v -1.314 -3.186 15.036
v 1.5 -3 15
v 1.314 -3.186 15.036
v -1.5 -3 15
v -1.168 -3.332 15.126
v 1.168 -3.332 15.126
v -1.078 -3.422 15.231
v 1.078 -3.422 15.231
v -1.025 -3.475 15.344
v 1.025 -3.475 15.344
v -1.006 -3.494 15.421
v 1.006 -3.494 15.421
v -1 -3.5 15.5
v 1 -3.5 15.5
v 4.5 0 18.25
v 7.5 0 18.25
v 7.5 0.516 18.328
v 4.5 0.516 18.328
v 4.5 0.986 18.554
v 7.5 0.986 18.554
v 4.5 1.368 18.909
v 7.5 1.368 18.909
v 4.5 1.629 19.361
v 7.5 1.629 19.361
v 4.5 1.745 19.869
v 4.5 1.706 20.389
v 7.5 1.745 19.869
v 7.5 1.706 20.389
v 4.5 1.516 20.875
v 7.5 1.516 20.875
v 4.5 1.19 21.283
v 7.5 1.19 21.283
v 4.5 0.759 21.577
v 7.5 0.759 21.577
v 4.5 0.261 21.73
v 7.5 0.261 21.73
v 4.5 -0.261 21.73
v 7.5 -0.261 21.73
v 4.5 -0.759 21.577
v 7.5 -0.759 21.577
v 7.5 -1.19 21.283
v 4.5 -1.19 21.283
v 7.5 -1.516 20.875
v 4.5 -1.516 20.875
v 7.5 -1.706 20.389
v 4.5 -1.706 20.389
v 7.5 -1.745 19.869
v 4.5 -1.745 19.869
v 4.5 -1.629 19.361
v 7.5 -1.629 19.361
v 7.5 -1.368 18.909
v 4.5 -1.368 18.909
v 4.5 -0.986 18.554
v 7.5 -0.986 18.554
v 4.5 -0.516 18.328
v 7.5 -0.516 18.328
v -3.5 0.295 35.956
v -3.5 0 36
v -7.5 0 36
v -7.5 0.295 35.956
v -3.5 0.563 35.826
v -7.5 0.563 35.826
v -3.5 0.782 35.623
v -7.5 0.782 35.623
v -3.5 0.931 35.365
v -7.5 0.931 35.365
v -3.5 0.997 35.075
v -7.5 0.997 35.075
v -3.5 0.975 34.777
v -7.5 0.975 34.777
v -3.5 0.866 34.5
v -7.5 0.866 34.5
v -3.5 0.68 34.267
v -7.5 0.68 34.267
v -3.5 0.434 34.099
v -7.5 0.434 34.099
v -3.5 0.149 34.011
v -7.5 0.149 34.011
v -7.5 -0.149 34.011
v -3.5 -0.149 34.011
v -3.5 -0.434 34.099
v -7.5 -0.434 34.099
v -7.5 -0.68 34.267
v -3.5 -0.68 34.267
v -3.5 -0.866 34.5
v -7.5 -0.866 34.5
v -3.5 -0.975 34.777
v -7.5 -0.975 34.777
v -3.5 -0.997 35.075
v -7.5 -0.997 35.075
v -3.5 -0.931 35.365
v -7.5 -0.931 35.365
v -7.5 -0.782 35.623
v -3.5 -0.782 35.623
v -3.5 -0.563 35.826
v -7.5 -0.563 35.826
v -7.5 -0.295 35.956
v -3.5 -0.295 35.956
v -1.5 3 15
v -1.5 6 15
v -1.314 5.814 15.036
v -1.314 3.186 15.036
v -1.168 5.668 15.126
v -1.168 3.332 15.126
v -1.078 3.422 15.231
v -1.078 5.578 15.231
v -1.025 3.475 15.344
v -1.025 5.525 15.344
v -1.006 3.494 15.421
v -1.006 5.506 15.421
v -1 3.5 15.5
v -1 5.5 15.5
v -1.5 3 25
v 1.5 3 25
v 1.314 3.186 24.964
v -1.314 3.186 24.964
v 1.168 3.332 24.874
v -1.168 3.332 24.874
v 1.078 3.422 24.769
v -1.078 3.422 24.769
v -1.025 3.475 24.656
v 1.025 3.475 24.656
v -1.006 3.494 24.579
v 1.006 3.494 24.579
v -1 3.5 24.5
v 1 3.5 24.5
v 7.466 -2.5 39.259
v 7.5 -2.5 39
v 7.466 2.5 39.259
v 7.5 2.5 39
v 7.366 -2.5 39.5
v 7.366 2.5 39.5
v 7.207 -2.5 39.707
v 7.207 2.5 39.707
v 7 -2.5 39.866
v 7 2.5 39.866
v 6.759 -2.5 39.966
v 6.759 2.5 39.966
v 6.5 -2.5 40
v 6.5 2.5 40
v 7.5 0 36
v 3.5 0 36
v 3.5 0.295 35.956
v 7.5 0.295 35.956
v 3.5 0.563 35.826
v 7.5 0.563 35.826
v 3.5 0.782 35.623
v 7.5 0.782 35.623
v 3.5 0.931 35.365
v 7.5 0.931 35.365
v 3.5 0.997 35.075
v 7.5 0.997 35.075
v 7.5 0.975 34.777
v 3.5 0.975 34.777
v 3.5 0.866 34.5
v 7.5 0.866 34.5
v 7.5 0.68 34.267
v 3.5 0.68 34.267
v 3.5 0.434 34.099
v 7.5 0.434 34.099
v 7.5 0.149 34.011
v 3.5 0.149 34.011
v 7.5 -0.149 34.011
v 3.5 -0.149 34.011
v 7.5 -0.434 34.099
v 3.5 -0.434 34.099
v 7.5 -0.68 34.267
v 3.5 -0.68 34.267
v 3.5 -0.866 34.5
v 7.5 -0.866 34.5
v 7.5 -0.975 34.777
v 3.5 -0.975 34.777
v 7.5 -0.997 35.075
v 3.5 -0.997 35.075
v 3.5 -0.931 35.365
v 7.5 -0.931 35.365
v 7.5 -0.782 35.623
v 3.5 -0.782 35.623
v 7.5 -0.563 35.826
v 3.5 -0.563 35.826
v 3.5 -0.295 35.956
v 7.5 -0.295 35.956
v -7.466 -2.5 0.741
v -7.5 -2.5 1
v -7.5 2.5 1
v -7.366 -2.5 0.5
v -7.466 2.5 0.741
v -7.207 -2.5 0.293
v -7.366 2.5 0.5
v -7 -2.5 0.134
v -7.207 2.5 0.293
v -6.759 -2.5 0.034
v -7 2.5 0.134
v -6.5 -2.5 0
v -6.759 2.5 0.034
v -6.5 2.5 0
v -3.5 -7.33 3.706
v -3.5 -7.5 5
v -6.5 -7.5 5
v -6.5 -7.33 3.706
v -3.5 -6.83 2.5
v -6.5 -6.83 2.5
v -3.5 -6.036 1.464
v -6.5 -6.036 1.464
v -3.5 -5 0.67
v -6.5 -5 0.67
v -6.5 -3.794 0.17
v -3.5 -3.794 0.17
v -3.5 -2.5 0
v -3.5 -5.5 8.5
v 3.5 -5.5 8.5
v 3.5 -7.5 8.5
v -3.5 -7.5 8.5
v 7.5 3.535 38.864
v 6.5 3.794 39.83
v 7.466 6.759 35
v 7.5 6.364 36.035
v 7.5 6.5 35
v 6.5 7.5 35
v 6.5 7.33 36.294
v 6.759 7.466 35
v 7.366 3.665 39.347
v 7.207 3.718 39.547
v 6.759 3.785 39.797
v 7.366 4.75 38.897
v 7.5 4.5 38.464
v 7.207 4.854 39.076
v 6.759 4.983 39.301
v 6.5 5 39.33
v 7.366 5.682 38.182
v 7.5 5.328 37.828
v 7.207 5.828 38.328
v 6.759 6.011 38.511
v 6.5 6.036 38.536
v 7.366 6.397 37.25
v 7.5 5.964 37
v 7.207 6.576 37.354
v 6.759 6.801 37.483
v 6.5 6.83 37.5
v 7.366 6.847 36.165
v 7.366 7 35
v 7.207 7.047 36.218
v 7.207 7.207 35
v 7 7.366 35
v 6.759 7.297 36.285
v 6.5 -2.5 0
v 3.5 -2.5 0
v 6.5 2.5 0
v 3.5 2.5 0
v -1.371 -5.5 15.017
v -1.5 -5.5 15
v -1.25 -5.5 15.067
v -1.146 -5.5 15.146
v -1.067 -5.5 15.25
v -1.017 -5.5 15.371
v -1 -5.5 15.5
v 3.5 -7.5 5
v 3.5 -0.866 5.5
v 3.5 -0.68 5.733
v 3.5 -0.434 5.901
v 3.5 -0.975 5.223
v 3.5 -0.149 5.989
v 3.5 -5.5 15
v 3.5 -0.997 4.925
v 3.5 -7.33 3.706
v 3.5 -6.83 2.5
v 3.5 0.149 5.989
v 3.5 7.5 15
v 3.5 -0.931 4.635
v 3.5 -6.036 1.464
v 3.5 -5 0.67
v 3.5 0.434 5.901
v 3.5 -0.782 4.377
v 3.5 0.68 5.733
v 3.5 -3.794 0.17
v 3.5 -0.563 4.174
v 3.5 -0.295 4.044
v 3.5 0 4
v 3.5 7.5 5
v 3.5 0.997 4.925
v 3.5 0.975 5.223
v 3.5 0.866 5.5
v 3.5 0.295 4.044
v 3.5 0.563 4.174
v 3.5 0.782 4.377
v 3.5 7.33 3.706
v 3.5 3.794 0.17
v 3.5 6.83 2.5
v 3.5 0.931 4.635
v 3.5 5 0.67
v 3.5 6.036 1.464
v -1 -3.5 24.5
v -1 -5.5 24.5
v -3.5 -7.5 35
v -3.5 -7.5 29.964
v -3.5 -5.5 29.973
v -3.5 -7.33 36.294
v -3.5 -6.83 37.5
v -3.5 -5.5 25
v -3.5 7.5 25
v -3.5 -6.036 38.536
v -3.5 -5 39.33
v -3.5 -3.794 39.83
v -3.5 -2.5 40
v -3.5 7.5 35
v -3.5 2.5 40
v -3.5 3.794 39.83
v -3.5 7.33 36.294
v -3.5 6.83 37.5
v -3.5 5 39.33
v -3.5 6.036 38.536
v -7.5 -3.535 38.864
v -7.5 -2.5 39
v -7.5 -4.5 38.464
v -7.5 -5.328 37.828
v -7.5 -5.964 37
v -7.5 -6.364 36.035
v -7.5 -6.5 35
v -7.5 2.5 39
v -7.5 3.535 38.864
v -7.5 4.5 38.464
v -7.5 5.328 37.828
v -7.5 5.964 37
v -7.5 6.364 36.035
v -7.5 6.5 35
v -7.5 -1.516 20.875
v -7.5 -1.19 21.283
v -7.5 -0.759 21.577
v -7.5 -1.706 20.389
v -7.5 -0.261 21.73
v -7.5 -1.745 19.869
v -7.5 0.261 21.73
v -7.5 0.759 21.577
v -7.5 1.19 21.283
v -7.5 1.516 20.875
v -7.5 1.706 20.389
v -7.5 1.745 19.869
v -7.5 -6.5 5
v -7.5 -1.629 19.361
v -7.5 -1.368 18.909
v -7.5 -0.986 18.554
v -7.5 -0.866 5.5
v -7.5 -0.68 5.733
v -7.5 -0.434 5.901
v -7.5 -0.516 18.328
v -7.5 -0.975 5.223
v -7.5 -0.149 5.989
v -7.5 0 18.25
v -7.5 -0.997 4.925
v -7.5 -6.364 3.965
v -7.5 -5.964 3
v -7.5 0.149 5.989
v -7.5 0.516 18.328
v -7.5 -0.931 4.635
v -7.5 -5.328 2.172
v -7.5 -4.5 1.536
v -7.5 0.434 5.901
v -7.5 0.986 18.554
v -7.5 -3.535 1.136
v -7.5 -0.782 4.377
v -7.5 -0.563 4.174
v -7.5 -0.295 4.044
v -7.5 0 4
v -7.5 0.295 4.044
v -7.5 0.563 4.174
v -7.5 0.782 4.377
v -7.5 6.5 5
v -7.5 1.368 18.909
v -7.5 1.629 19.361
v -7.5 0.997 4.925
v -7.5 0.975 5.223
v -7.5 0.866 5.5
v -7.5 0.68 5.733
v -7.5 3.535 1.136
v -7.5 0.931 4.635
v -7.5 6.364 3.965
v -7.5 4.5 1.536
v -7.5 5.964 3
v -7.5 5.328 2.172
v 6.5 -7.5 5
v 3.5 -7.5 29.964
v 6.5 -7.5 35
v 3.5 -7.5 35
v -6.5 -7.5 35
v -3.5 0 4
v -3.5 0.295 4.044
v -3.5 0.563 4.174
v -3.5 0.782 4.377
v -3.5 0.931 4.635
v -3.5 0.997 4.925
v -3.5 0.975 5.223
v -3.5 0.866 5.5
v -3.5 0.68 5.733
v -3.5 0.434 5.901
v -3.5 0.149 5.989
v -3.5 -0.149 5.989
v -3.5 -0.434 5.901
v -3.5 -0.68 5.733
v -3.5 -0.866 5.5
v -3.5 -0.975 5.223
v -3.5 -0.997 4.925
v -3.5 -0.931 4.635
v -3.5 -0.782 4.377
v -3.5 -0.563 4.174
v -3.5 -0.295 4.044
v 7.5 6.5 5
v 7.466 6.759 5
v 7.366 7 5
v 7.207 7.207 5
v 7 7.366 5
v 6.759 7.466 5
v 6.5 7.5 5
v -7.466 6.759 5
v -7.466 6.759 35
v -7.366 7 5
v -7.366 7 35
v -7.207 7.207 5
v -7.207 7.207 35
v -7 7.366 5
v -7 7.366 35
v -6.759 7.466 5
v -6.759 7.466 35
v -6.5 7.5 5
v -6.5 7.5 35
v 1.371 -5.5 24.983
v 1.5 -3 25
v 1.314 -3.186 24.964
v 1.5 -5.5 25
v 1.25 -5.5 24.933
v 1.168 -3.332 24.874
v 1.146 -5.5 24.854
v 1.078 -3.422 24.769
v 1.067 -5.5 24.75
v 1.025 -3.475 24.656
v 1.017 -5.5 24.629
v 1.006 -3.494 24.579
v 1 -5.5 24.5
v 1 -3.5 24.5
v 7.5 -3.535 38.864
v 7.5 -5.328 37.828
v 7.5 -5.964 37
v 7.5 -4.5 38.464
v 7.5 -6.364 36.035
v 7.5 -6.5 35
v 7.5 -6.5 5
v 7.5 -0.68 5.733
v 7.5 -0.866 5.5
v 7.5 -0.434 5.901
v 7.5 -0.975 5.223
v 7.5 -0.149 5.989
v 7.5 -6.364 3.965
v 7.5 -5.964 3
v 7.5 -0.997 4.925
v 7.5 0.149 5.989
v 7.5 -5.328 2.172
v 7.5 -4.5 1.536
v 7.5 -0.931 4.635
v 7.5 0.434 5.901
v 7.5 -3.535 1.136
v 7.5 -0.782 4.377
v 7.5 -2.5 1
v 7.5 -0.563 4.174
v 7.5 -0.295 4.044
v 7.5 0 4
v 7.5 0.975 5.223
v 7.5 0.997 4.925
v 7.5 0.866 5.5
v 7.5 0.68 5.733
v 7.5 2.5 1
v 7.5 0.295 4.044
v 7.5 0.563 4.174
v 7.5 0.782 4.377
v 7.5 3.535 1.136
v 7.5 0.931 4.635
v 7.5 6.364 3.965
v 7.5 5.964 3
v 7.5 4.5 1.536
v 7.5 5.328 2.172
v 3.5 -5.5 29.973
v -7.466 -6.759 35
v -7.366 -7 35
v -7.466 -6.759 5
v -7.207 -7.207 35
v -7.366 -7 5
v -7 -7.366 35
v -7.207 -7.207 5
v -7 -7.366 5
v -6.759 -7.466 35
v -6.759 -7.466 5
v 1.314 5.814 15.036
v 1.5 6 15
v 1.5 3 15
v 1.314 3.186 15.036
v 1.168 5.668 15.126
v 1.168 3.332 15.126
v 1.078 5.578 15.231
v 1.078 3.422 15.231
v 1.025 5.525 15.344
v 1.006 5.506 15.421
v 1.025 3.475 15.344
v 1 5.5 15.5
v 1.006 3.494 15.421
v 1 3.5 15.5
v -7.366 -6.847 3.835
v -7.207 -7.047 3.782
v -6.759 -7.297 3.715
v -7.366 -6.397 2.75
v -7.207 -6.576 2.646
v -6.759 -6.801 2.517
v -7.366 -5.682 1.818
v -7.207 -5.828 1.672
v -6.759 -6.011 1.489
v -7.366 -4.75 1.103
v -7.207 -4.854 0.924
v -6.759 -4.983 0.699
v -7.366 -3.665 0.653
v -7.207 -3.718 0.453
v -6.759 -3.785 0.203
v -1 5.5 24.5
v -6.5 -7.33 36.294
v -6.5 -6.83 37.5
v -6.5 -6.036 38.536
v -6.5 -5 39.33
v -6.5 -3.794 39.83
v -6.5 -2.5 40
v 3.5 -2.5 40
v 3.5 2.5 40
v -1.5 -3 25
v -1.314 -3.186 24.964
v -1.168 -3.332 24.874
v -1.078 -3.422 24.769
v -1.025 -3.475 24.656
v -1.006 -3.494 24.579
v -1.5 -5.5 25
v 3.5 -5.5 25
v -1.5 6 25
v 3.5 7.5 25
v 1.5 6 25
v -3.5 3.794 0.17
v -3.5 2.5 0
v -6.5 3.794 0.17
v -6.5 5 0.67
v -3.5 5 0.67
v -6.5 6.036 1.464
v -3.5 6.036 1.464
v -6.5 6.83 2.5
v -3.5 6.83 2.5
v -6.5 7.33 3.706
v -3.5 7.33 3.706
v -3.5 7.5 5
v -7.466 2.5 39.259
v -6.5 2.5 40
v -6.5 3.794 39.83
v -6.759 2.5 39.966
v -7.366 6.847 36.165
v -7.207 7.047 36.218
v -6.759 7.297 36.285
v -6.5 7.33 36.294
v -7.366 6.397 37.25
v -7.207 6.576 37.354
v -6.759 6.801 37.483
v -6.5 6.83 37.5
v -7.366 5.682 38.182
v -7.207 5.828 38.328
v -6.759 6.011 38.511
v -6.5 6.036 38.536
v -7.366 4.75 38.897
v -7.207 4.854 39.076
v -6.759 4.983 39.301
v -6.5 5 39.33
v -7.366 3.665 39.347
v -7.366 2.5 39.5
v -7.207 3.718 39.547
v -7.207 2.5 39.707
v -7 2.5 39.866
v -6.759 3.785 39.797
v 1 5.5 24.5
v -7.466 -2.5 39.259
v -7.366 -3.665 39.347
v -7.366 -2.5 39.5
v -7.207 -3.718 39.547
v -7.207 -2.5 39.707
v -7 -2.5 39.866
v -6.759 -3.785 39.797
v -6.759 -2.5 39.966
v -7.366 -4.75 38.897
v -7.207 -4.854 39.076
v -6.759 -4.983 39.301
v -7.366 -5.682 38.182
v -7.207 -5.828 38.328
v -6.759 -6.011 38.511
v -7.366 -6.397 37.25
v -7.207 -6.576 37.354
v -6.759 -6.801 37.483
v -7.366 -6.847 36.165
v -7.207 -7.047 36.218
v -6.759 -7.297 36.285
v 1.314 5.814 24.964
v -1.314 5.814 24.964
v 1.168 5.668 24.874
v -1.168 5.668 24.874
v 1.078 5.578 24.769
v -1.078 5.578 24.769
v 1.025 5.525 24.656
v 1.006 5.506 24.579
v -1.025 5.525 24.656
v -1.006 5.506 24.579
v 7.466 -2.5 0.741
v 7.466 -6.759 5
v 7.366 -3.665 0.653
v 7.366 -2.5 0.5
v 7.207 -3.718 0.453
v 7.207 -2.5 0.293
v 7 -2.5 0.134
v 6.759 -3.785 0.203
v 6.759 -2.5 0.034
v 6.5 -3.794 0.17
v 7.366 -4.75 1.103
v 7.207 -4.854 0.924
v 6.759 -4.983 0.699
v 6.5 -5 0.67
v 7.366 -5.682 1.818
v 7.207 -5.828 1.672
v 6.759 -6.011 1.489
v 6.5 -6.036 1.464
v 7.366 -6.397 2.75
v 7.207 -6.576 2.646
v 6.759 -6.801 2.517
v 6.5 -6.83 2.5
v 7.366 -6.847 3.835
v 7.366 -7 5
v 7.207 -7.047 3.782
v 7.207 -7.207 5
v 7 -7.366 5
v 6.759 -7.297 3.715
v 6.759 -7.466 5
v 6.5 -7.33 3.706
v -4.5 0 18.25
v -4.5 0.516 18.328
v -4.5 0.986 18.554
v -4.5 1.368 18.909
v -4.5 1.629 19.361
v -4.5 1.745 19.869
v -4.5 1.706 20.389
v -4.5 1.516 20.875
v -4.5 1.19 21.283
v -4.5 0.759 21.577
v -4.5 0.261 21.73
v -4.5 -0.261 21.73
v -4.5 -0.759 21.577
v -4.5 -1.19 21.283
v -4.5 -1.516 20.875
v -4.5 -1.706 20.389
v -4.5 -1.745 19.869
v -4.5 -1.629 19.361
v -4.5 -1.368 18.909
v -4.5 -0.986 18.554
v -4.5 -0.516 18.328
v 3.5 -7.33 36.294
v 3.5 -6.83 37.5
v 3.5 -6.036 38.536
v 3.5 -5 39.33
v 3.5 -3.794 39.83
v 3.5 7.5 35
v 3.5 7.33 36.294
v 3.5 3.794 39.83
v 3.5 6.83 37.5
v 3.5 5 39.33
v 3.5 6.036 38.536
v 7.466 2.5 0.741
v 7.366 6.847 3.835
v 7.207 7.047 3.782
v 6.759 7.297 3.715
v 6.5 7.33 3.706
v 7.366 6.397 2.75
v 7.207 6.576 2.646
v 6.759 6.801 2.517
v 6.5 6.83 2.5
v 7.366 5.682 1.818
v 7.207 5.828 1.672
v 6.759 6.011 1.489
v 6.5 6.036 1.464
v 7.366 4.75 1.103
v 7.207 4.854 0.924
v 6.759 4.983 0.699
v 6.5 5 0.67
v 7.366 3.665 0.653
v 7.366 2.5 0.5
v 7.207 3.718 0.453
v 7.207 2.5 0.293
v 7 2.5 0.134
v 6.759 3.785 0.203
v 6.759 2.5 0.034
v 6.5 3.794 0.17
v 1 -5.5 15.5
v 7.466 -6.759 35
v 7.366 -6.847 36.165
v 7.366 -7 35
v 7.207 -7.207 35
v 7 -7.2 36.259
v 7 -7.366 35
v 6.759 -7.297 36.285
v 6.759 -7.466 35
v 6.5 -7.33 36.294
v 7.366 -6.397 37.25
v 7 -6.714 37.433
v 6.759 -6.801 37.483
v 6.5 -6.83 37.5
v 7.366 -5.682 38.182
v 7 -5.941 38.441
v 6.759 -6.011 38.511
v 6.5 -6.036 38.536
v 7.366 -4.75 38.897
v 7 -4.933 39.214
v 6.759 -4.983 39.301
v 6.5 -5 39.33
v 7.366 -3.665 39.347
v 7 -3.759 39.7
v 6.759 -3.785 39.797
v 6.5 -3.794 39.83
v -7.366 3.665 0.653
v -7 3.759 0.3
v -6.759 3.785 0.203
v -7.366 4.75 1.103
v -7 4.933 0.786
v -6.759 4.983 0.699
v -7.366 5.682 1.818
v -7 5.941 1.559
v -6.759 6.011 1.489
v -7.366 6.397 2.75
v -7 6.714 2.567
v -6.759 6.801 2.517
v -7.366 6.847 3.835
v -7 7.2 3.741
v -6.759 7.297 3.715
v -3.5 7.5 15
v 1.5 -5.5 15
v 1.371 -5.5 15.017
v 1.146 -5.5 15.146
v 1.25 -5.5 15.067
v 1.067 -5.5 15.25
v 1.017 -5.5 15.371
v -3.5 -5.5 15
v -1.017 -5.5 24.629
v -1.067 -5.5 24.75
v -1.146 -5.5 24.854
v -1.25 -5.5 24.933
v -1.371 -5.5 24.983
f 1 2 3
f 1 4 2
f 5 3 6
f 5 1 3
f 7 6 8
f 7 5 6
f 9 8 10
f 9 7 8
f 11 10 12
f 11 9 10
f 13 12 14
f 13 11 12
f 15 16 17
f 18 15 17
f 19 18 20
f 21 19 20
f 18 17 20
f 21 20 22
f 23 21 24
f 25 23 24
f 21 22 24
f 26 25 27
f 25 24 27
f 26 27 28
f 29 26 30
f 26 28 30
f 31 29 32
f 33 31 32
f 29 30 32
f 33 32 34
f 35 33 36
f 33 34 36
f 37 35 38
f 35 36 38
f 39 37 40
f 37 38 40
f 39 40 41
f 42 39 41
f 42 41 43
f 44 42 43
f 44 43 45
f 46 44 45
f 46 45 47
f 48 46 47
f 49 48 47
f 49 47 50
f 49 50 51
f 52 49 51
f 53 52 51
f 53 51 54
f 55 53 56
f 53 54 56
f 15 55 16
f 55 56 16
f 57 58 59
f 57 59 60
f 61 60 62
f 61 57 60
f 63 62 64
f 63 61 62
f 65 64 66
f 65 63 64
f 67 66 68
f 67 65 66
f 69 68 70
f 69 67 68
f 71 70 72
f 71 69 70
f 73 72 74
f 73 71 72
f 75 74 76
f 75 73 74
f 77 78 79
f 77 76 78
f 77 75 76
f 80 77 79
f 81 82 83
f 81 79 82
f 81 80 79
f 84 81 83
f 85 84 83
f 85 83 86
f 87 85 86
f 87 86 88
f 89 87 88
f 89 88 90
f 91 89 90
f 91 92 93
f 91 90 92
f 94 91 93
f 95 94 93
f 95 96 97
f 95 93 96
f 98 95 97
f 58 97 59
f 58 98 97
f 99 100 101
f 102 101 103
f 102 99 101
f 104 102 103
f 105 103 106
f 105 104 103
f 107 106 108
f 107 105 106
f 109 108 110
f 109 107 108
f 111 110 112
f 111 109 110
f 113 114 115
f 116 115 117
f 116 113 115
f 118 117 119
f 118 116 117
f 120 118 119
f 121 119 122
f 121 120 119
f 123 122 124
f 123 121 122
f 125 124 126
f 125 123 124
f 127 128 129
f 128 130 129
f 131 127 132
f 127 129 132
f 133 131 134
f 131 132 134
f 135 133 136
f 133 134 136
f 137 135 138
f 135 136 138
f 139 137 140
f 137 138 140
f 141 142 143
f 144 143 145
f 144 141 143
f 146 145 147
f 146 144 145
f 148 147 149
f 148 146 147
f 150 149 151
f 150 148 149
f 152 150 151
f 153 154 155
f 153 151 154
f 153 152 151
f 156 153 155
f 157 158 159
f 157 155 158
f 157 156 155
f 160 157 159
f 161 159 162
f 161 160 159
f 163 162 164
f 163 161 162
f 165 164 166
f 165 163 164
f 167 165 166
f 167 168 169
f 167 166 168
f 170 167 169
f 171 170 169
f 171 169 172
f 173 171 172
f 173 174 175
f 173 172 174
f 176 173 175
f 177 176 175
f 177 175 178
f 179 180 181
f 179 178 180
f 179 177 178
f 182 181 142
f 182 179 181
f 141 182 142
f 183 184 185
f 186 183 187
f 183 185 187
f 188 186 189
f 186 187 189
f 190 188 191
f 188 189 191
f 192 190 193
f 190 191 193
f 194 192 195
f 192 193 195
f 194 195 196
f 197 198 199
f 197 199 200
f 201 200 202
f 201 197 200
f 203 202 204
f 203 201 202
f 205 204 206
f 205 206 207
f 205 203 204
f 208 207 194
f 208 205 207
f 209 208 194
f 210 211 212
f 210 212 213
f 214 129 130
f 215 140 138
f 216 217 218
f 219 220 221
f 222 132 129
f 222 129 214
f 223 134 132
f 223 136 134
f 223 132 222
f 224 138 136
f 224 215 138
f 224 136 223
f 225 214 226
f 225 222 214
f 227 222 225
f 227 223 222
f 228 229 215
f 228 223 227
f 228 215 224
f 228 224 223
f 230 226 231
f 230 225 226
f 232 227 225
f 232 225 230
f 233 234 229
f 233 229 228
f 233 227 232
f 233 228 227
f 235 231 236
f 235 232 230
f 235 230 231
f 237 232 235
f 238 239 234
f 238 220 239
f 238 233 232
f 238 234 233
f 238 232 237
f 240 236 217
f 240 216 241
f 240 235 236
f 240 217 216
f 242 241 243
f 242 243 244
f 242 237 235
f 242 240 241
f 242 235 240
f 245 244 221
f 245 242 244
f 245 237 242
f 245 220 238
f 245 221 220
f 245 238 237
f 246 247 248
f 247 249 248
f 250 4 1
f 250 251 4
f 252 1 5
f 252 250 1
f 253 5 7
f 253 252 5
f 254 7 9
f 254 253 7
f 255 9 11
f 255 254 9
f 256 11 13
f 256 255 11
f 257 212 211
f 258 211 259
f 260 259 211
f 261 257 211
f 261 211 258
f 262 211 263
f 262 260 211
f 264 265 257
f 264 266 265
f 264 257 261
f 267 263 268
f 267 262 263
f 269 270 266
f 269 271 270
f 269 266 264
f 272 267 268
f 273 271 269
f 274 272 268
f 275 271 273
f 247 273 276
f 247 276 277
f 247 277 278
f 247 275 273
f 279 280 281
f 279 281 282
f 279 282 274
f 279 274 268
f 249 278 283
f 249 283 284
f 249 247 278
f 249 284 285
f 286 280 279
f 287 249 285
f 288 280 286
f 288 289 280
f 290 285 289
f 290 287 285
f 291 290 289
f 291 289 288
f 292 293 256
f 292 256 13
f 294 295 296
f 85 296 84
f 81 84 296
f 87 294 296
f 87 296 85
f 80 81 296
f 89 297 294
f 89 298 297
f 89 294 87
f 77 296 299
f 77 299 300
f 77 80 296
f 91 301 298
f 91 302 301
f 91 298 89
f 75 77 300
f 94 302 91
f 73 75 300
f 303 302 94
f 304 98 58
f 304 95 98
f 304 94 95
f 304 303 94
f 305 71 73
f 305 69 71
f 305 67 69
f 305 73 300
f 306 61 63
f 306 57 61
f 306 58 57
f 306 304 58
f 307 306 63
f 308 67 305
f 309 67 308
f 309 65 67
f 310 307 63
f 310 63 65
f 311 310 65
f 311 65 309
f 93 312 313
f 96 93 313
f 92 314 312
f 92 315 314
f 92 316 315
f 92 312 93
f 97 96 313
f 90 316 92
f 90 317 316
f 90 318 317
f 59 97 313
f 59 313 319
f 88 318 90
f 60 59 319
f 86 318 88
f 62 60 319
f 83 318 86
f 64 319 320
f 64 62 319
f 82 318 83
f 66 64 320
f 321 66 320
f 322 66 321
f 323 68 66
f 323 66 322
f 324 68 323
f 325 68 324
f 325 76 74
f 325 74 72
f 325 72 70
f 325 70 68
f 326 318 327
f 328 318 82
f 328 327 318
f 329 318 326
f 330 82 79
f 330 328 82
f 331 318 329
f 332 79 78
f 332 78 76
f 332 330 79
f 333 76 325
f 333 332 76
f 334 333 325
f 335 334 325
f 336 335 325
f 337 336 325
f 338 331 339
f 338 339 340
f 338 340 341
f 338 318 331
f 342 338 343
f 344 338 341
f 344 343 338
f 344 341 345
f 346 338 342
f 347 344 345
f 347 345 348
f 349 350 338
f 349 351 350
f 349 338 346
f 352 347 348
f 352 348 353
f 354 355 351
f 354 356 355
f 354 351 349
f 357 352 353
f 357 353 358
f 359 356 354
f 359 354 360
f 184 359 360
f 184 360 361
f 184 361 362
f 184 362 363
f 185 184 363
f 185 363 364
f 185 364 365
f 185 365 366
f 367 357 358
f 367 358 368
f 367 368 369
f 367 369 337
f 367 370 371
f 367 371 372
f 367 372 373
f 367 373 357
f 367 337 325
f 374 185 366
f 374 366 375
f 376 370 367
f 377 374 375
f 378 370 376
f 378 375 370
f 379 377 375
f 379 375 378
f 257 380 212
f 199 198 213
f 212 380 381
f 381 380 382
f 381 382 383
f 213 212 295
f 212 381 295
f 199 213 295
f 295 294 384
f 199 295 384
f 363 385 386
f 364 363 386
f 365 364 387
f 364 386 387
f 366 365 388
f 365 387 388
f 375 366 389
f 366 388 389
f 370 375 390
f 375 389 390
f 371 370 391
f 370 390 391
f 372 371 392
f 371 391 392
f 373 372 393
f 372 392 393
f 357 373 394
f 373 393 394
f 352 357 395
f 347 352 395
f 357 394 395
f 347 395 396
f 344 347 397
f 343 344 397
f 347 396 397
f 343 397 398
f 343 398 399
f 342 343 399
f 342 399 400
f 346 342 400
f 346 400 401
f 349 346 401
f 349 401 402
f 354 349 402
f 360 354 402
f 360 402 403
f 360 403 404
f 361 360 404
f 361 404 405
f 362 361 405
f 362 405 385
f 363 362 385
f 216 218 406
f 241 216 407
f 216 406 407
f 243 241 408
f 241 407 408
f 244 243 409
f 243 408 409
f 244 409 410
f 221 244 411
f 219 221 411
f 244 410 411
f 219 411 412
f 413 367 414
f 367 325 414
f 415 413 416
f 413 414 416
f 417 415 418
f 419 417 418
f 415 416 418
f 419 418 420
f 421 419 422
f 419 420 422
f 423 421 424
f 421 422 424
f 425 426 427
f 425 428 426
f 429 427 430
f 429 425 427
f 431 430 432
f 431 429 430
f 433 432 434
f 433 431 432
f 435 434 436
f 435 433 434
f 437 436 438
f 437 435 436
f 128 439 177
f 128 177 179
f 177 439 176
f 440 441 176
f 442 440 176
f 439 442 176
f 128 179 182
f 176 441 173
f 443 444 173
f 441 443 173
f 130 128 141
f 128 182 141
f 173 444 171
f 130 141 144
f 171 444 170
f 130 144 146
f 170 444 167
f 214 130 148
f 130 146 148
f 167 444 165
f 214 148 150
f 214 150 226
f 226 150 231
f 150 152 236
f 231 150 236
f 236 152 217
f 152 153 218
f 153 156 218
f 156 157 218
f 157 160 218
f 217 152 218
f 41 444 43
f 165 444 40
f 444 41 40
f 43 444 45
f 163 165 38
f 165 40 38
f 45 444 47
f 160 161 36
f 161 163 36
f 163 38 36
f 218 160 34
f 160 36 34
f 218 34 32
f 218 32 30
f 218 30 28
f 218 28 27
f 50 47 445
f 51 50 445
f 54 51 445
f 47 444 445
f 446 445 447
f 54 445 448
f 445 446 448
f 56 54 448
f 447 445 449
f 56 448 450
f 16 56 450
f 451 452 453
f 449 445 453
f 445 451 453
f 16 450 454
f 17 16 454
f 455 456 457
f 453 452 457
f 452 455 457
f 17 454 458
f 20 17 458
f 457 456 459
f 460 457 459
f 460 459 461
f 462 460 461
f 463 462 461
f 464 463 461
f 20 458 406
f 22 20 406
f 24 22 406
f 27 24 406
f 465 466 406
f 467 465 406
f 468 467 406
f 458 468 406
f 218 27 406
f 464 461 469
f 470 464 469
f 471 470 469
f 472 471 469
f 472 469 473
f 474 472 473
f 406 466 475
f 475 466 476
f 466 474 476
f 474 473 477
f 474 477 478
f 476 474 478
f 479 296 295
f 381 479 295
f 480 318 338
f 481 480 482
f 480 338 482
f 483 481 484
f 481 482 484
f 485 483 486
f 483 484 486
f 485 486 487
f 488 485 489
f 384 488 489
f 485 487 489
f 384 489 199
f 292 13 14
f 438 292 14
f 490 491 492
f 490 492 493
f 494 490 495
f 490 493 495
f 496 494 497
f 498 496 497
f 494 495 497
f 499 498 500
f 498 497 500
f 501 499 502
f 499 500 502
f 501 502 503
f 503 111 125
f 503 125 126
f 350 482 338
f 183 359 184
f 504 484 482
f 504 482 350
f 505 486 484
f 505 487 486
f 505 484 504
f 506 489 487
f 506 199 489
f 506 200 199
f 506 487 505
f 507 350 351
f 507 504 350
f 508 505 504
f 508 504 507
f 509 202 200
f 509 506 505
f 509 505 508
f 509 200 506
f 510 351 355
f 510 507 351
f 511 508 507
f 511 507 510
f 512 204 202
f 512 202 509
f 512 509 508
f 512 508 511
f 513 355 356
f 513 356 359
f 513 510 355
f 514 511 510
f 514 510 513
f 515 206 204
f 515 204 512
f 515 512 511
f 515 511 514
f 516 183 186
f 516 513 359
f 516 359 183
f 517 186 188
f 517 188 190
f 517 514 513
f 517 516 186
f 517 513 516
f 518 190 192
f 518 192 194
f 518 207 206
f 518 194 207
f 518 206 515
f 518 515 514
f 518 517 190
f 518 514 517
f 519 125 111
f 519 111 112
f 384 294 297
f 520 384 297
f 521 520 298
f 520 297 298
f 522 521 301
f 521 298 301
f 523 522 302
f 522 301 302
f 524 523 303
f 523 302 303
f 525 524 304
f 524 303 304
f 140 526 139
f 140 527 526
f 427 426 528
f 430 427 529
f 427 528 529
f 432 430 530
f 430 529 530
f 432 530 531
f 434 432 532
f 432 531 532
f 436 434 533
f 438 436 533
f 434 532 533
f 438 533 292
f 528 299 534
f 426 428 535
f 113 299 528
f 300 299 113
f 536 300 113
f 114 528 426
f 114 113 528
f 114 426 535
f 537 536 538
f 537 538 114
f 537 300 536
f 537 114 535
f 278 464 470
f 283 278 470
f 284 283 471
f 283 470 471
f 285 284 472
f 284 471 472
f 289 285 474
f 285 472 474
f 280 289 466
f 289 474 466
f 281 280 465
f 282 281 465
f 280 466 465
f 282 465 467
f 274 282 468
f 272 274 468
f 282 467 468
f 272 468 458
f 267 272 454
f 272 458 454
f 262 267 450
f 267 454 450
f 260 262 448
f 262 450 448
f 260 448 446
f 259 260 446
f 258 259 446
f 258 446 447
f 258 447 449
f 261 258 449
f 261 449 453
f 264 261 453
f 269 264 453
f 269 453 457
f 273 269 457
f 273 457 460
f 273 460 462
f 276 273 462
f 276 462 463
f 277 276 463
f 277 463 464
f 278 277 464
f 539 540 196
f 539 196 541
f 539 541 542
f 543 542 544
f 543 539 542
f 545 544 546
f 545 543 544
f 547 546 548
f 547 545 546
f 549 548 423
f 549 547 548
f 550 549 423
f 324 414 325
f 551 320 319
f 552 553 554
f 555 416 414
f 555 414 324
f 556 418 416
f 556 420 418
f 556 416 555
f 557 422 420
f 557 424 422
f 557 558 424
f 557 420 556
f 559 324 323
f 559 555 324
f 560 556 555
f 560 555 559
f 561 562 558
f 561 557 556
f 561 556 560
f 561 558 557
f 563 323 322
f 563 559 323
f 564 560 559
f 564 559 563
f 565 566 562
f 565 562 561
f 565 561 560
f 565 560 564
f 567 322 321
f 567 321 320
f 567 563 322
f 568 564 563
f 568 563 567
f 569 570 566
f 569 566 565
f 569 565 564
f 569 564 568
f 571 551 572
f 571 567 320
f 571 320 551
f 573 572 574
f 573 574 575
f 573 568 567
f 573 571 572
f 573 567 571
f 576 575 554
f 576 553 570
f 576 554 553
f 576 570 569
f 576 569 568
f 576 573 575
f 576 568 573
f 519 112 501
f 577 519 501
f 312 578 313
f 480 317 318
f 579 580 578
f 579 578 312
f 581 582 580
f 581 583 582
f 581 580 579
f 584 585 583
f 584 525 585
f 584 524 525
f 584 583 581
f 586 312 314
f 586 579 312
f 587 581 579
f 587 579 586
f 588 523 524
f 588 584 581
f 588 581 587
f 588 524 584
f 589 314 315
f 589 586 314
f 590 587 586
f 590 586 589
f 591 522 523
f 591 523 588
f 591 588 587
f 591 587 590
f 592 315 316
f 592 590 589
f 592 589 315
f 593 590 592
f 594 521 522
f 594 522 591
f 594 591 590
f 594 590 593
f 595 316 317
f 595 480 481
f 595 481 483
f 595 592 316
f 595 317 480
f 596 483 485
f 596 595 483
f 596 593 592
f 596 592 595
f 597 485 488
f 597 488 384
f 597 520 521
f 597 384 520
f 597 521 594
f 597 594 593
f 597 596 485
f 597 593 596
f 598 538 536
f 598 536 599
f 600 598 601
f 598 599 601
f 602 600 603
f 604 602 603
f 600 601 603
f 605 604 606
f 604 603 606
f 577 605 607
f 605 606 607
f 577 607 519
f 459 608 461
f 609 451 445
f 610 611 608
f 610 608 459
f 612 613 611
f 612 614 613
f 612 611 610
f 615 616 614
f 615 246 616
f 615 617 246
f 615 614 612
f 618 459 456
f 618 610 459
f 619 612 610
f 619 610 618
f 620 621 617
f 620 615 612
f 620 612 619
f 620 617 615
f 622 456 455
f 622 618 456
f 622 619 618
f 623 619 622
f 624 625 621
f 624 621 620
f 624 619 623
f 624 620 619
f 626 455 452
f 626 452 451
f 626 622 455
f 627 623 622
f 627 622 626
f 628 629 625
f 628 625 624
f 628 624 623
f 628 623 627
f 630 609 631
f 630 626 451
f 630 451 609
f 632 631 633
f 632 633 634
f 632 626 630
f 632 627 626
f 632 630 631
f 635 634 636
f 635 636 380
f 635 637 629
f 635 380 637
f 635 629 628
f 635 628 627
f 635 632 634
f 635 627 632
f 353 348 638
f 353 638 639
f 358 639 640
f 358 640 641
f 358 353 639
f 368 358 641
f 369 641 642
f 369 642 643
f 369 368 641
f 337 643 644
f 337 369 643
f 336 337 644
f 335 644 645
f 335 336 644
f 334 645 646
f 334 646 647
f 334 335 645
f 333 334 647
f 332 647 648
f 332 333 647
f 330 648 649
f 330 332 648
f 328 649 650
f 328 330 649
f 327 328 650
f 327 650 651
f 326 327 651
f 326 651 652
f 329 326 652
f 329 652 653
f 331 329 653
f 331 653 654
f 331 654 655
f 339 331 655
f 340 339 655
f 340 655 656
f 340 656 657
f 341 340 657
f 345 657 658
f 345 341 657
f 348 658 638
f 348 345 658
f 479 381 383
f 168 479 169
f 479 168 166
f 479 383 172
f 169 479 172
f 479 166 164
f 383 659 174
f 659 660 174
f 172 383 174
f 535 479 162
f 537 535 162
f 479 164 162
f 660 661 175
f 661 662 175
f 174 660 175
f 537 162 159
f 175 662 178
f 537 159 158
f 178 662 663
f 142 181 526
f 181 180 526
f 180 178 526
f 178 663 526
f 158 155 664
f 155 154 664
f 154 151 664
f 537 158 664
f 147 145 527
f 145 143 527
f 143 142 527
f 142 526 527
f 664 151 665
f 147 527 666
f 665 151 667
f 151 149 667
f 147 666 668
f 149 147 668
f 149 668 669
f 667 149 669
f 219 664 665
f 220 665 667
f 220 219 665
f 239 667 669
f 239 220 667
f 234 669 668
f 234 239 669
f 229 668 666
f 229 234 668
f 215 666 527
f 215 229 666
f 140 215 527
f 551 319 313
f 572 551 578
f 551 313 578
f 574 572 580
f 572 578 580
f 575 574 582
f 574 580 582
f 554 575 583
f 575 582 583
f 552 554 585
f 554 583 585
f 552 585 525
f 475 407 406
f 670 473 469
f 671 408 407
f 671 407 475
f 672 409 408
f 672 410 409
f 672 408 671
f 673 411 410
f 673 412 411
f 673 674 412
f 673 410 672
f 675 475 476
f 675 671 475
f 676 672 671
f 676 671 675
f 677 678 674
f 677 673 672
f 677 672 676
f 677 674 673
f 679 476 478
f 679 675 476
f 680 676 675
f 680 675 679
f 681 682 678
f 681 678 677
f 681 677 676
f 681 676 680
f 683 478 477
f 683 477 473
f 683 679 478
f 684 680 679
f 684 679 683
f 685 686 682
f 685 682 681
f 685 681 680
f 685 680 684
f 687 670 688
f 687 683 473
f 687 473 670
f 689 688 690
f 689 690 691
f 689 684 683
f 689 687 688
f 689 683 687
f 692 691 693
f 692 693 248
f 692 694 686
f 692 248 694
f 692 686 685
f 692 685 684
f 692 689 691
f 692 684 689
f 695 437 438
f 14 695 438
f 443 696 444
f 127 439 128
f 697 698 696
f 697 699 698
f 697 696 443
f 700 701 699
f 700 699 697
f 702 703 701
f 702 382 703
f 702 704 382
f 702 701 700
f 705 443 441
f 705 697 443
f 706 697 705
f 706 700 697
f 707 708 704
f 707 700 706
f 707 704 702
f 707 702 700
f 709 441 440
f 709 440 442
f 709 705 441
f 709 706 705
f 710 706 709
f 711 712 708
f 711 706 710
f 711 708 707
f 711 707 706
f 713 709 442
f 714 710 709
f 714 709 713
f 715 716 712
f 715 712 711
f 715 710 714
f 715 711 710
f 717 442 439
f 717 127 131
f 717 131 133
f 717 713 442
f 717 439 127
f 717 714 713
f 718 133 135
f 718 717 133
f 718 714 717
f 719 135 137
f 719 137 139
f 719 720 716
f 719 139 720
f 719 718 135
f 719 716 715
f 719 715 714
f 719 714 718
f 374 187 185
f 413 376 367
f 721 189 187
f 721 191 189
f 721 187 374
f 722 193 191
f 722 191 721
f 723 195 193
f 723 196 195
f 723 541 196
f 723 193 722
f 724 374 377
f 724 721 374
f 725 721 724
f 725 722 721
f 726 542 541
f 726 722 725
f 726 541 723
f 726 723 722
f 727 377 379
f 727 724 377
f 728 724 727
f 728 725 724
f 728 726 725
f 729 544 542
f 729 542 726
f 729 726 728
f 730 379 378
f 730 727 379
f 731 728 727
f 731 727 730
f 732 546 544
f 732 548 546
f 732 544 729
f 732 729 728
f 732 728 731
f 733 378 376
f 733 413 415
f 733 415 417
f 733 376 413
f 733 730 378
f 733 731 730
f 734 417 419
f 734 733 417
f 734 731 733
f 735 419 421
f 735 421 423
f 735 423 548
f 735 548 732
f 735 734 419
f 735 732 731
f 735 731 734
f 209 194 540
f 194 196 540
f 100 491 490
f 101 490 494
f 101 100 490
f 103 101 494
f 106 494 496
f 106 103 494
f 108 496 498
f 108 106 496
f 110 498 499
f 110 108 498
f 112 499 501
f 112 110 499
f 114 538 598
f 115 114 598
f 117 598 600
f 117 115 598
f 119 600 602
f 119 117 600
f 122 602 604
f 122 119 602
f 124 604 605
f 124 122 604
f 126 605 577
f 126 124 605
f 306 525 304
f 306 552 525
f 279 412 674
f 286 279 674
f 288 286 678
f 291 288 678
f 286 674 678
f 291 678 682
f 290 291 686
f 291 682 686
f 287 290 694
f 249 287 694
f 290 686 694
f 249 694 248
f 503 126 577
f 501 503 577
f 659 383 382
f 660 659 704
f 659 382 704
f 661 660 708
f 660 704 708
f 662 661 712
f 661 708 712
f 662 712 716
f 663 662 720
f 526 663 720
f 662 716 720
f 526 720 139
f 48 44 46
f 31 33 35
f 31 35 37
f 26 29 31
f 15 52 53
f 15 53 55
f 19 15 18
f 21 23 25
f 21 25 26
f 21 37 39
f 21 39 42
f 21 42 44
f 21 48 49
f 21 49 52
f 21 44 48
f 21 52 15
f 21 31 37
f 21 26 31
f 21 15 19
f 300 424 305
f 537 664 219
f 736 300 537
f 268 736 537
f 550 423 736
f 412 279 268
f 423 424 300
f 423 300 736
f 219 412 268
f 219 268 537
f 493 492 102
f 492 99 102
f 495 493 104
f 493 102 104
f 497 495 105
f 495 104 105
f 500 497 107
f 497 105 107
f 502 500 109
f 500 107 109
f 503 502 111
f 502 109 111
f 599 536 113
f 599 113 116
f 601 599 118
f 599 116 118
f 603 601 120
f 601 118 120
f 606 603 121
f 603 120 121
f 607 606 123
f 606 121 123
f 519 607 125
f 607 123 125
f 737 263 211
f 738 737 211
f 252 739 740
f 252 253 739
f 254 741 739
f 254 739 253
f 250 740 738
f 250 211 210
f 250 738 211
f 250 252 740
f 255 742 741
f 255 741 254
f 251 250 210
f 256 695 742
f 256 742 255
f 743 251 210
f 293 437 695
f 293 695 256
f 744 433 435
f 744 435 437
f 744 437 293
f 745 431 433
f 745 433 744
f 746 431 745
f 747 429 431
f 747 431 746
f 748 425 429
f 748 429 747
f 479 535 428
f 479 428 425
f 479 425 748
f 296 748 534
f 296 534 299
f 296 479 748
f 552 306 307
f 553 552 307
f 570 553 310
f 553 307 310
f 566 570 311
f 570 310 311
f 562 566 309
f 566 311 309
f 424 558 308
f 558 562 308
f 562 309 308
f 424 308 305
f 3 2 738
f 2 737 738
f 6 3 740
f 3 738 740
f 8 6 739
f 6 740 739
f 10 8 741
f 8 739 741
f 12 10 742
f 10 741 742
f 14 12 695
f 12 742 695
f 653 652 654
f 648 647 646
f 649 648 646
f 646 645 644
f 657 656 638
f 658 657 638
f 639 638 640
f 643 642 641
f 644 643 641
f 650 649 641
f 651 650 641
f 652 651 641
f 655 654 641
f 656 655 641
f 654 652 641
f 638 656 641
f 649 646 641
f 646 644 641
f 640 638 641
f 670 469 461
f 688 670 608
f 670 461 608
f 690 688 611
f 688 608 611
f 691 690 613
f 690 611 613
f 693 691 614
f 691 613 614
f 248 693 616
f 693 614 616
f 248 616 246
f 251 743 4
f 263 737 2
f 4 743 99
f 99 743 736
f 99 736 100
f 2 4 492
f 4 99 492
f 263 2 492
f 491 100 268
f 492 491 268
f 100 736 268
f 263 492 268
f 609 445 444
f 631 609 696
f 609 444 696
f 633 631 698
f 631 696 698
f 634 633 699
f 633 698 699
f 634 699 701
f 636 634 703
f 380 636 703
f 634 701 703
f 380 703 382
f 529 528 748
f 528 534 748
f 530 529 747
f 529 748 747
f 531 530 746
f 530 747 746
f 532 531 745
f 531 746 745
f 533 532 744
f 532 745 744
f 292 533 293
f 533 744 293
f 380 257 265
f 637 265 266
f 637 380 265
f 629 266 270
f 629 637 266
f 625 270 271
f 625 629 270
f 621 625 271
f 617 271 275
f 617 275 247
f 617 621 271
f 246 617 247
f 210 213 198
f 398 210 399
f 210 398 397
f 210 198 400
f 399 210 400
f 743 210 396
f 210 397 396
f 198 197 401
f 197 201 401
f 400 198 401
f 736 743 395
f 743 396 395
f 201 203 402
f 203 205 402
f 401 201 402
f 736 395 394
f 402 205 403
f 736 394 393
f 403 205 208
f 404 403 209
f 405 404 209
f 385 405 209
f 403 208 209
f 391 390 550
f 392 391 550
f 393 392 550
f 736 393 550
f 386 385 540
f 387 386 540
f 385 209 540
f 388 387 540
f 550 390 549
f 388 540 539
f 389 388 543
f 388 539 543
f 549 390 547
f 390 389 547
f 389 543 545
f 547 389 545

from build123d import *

# Parameters (mm, degrees)
BOTTOM_SECTION_BASE_SKETCH_W             = 15
BOTTOM_SECTION_BASE_SKETCH_H             = 15
BOTTOM_SECTION_EXTRUDE_DEPTH             = 40
HINGE_CUTOUT_SKETCH_W                    = 7
HINGE_CUTOUT_SKETCH_H                    = 15
HINGE_CUTOUT_EXTRUDED_CUT_DEPTH          = 15
HINGE_HOLE_SKETCH_R                      = 1
HINGE_HOLE_EXTRUDED_CUT_DEPTH            = 44.373378932
HINGER_CORNER_FILLETS_R                  = 5
STYLE_FILLETS_R                          = 1
ROUTING_HOLES_SKETCH_W                   = 2
ROUTING_HOLES_SKETCH_H                   = 2
ROUTING_HOLES_EXTRUDED_CUT_DEPTH         = 42.382363393
BACKING_START                            = -3.5
BACKING_EXTRUDE_DEPTH                    = 7
BOTTOM_SECTION_CONNECTION_HOLE_R         = 1.75
BOTTOM_SECTION_CONNECTION_HOLE_CUT_DEPTH = 3
SKETCH2_W                                = 7
SKETCH2_H                                = 2
BOTTOM_EXTENSION_EXTRUDE_DEPTH           = 6.5
FILLET1_R                                = 0.5


# Read off the part's stored shape, not the designer's step: Backing Extrude
with BuildPart() as part:
    # Bottom Section Base Sketch → Bottom Section Extrude (new body)
    with BuildSketch(Plane.XY):
        Rectangle(BOTTOM_SECTION_BASE_SKETCH_W, BOTTOM_SECTION_BASE_SKETCH_H)
    extrude(amount=BOTTOM_SECTION_EXTRUDE_DEPTH)

    # Hinge Cutout Sketch → Hinge Cutout Extruded Cut (cut)
    with BuildSketch(Plane.XY):
        Rectangle(HINGE_CUTOUT_SKETCH_W, HINGE_CUTOUT_SKETCH_H)
    hinge_cutout_extruded_cut = extrude(amount=HINGE_CUTOUT_EXTRUDED_CUT_DEPTH, mode=Mode.SUBTRACT)

    # Hinge Hole Sketch → Hinge Hole Extruded Cut (cut, through all)
    with BuildSketch(Plane(origin=(7.5, 0, 0), x_dir=(0, 0, -1), z_dir=(1, 0, 0))):
        with Locations((-5, 0)):
            Circle(HINGE_HOLE_SKETCH_R)
    hinge_hole_extruded_cut = extrude(amount=-HINGE_HOLE_EXTRUDED_CUT_DEPTH, mode=Mode.SUBTRACT)

    # Hinge and Hole Cutout Mirror: Hinge Cutout Extruded Cut, Hinge Hole Extruded Cut across plane
    add(hinge_cutout_extruded_cut.mirror(Plane.XY.offset(20)), mode=Mode.SUBTRACT)
    add(hinge_hole_extruded_cut.mirror(Plane.XY.offset(20)), mode=Mode.SUBTRACT)

    # Hinger Corner Fillets
    hinger_corner_fillets_edges = [part.edges().sort_by_distance(p)[0] for p in [
        (5.5, -7.5, 0),
        (-5.5, 7.5, 0),
        (-5.5, -7.5, 40),
        (-5.5, 7.5, 40),
        (5.5, -7.5, 40),
        (-5.5, -7.5, 0),
        (5.5, 7.5, 0),
        (5.5, 7.5, 40),
    ]]
    fillet(hinger_corner_fillets_edges, radius=HINGER_CORNER_FILLETS_R)

    # Style Fillets
    style_fillets_edges = [part.edges().sort_by_distance(p)[0] for p in [
        (7.5, 0, 40),
        (7.5, 7.5, 20),
        (-7.5, 7.5, 20),
        (7.5, 0, 0),
        (7.5, -7.5, 20),
        (7.5, 6.035533906, 1.464466094),
        (7.5, -6.035533906, 1.464466094),
        (7.5, -6.035533906, 38.535533906),
        (7.5, 6.035533906, 38.535533906),
        (-7.5, -7.5, 20),
        (-7.5, 0, 40),
        (-7.5, 0, 0),
        (-7.5, -6.035533906, 1.464466094),
        (-7.5, 6.035533906, 1.464466094),
        (-7.5, 6.035533906, 38.535533906),
        (-7.5, -6.035533906, 38.535533906),
    ]]
    fillet(style_fillets_edges, radius=STYLE_FILLETS_R)

    # Routing Holes Sketch → Routing Holes Extruded Cut (cut, through all)
    with BuildSketch(Plane.XY):
        with Locations((0, 4.5)):
            Rectangle(ROUTING_HOLES_SKETCH_W, ROUTING_HOLES_SKETCH_H)
        with Locations((0, -4.5)):
            Rectangle(ROUTING_HOLES_SKETCH_W, ROUTING_HOLES_SKETCH_H)
    extrude(amount=ROUTING_HOLES_EXTRUDED_CUT_DEPTH, mode=Mode.SUBTRACT)

    # Backing Extrude outline → Backing Extrude (add)
    with BuildSketch(Plane.YZ.offset(BACKING_START)):
        Polygon((-7.5, 29.963646865), (-7.5, 25), (-5.5, 25), (-5.5, 29.973325422), align=None)
    extrude(amount=BACKING_EXTRUDE_DEPTH)

    # Bottom Section Connection Hole → Bottom Section Connection Hole Cut (cut)
    with BuildSketch(Plane(origin=(7.5, 0, 0), x_dir=(0, 0, -1), z_dir=(1, 0, 0))):
        with Locations((-20, 0)):
            Circle(BOTTOM_SECTION_CONNECTION_HOLE_R)
    bottom_section_connection_hole_cut = extrude(amount=-BOTTOM_SECTION_CONNECTION_HOLE_CUT_DEPTH, mode=Mode.SUBTRACT)

    # Sketch2 → Bottom extension Extrude (add)
    with BuildSketch(Plane(origin=(0, 0, 15), x_dir=(-1, 0, 0), z_dir=(0, 0, -1))):
        with Locations((0, -6.5)):
            Rectangle(SKETCH2_W, SKETCH2_H)
    extrude(amount=BOTTOM_EXTENSION_EXTRUDE_DEPTH)

    # Connection Hole Mirror: Bottom Section Connection Hole Cut across plane
    add(bottom_section_connection_hole_cut.mirror(Plane(origin=(0, 0, 0), x_dir=(0, 0, 1), z_dir=(1, 0, 0))), mode=Mode.SUBTRACT)

    # Fillet1
    fillet1_edges = [part.edges().sort_by_distance(p)[0] for p in [
        (-1, -4.5, 25),
        (0, -3.5, 25),
        (1, -4.5, 25),
        (0, 5.5, 25),
        (1, 4.5, 25),
        (0, 3.5, 25),
        (-1, 4.5, 25),
        (-1, 4.5, 15),
        (0, 3.5, 15),
        (1, 4.5, 15),
        (0, 5.5, 15),
        (1, -4.5, 15),
        (0, -3.5, 15),
        (-1, -4.5, 15),
    ]]
    fillet(fillet1_edges, radius=FILLET1_R)


solid = part.part
